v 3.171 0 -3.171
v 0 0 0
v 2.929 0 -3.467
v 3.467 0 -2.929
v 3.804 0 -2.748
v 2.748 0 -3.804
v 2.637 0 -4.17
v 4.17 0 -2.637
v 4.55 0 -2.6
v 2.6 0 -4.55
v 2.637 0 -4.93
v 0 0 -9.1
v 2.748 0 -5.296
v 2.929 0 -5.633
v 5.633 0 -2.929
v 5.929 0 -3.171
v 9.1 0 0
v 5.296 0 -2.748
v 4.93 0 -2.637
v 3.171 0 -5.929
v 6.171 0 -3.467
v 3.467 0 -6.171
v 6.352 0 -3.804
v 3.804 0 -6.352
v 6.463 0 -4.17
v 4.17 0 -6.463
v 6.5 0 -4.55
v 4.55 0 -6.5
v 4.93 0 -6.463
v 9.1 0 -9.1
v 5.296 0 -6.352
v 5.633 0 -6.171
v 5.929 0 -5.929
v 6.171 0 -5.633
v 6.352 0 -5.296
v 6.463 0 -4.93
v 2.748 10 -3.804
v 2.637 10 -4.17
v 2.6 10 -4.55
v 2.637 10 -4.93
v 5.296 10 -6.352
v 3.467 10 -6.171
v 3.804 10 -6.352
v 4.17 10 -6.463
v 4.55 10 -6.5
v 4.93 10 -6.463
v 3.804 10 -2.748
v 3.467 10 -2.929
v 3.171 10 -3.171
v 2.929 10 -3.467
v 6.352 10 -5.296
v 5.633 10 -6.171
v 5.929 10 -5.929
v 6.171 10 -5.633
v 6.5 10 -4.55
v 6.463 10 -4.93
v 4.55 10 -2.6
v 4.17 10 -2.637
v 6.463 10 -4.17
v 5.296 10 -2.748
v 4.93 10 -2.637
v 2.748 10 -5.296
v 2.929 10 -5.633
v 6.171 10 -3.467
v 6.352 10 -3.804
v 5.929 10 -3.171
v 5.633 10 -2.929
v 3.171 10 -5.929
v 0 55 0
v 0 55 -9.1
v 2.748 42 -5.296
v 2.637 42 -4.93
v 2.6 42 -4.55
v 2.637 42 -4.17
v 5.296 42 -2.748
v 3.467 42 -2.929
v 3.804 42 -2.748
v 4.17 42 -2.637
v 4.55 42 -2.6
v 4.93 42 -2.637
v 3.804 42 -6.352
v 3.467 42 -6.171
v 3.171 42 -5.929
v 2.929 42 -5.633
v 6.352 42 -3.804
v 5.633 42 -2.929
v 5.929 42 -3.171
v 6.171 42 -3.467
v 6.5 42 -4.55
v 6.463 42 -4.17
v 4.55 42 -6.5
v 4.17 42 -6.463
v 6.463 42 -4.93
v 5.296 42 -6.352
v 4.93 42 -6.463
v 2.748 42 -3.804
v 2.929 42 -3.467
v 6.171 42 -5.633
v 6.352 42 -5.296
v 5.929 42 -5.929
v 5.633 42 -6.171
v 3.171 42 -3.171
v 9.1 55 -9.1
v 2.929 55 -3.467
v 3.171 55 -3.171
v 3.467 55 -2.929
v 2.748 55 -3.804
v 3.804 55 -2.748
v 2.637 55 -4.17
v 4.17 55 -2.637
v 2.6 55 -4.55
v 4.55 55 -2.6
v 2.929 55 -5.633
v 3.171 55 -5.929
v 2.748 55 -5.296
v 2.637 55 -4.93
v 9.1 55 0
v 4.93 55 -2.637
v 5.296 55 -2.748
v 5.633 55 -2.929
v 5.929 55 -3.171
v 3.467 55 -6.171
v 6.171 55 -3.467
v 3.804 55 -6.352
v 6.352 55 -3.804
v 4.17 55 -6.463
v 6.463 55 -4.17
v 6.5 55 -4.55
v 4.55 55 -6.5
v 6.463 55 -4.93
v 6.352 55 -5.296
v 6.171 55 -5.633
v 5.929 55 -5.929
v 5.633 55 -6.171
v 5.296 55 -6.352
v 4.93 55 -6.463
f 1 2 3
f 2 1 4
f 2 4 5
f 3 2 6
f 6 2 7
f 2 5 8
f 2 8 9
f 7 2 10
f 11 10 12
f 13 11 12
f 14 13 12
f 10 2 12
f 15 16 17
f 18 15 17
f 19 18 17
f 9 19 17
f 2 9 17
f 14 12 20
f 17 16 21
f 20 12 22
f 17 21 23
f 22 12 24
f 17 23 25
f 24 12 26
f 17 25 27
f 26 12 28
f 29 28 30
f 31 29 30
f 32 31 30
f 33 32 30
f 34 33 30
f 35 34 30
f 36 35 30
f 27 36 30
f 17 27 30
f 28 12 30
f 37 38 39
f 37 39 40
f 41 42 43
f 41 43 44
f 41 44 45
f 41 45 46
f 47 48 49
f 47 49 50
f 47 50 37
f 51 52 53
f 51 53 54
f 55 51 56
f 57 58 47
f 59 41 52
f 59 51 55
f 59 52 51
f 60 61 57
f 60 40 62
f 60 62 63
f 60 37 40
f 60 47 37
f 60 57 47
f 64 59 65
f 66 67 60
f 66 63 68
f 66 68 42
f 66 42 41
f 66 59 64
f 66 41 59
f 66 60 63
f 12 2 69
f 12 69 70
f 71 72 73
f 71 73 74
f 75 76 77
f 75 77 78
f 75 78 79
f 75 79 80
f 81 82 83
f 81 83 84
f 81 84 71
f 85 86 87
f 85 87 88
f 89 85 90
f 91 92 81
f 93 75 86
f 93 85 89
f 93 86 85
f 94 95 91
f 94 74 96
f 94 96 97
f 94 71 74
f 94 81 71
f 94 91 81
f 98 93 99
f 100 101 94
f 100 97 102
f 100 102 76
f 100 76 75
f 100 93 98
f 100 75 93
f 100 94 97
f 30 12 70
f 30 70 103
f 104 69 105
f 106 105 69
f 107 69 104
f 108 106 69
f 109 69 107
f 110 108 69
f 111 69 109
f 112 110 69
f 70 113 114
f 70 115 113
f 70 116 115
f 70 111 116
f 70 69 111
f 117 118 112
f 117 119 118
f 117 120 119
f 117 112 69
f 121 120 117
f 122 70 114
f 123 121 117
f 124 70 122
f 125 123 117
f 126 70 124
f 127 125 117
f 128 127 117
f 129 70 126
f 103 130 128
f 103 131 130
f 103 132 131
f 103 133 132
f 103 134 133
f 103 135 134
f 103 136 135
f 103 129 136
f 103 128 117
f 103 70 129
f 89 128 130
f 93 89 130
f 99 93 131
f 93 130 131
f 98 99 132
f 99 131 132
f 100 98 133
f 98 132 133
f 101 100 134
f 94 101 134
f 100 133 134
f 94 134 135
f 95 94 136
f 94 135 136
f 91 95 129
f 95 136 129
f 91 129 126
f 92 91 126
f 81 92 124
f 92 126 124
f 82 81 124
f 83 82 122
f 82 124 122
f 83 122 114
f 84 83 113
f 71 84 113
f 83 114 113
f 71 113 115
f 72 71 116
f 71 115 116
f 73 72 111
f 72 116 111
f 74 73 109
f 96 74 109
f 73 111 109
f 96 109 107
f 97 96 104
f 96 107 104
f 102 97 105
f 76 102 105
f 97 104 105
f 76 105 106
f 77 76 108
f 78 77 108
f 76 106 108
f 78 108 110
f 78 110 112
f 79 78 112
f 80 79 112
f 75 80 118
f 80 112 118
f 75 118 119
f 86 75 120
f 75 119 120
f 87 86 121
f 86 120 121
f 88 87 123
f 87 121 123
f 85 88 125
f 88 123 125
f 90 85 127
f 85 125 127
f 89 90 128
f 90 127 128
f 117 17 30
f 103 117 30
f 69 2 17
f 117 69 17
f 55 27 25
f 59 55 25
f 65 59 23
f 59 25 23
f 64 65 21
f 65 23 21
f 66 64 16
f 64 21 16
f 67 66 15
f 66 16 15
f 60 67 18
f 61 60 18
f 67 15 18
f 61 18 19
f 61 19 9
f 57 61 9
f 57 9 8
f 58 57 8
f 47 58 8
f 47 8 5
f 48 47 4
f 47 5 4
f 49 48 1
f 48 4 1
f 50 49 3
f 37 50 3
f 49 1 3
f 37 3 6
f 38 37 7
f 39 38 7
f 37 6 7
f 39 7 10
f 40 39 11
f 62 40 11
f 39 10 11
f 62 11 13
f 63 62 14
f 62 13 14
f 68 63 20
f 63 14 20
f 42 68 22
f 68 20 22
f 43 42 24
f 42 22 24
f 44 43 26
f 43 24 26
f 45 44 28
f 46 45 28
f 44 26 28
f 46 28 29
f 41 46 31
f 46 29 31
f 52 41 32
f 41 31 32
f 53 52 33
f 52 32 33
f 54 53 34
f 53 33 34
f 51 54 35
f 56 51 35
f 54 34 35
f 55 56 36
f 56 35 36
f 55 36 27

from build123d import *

# Parameters (mm, degrees)
CROQUIS1_W              = 9.1
CROQUIS1_H              = 9.1
SALIENTE_EXTRUIR1_DEPTH = 55
CROQUIS2_R              = 1.95
CORTAR_EXTRUIR1_DEPTH   = 13
CROQUIS3_R              = 1.95
CORTAR_EXTRUIR2_DEPTH   = 10


with BuildPart() as part:
    # Croquis1 → Saliente-Extruir1 (new body)
    with BuildSketch(Plane(origin=(0, 0, 0), x_dir=(1, 0, 0), z_dir=(0, 1, 0))):
        with Locations((4.55, 4.55)):
            Rectangle(CROQUIS1_W, CROQUIS1_H)
    extrude(amount=SALIENTE_EXTRUIR1_DEPTH)

    # Croquis2 → Cortar-Extruir1 (cut)
    with BuildSketch(Plane(origin=(0, 55, 0), x_dir=(1, 0, 0), z_dir=(0, 1, 0))):
        with Locations((4.55, 4.55)):
            Circle(CROQUIS2_R)
    extrude(amount=-CORTAR_EXTRUIR1_DEPTH, mode=Mode.SUBTRACT)

    # Croquis3 → Cortar-Extruir2 (cut)
    with BuildSketch(Plane.XZ):
        with Locations((4.55, -4.55)):
            Circle(CROQUIS3_R)
    extrude(amount=-CORTAR_EXTRUIR2_DEPTH, mode=Mode.SUBTRACT)


solid = part.part
